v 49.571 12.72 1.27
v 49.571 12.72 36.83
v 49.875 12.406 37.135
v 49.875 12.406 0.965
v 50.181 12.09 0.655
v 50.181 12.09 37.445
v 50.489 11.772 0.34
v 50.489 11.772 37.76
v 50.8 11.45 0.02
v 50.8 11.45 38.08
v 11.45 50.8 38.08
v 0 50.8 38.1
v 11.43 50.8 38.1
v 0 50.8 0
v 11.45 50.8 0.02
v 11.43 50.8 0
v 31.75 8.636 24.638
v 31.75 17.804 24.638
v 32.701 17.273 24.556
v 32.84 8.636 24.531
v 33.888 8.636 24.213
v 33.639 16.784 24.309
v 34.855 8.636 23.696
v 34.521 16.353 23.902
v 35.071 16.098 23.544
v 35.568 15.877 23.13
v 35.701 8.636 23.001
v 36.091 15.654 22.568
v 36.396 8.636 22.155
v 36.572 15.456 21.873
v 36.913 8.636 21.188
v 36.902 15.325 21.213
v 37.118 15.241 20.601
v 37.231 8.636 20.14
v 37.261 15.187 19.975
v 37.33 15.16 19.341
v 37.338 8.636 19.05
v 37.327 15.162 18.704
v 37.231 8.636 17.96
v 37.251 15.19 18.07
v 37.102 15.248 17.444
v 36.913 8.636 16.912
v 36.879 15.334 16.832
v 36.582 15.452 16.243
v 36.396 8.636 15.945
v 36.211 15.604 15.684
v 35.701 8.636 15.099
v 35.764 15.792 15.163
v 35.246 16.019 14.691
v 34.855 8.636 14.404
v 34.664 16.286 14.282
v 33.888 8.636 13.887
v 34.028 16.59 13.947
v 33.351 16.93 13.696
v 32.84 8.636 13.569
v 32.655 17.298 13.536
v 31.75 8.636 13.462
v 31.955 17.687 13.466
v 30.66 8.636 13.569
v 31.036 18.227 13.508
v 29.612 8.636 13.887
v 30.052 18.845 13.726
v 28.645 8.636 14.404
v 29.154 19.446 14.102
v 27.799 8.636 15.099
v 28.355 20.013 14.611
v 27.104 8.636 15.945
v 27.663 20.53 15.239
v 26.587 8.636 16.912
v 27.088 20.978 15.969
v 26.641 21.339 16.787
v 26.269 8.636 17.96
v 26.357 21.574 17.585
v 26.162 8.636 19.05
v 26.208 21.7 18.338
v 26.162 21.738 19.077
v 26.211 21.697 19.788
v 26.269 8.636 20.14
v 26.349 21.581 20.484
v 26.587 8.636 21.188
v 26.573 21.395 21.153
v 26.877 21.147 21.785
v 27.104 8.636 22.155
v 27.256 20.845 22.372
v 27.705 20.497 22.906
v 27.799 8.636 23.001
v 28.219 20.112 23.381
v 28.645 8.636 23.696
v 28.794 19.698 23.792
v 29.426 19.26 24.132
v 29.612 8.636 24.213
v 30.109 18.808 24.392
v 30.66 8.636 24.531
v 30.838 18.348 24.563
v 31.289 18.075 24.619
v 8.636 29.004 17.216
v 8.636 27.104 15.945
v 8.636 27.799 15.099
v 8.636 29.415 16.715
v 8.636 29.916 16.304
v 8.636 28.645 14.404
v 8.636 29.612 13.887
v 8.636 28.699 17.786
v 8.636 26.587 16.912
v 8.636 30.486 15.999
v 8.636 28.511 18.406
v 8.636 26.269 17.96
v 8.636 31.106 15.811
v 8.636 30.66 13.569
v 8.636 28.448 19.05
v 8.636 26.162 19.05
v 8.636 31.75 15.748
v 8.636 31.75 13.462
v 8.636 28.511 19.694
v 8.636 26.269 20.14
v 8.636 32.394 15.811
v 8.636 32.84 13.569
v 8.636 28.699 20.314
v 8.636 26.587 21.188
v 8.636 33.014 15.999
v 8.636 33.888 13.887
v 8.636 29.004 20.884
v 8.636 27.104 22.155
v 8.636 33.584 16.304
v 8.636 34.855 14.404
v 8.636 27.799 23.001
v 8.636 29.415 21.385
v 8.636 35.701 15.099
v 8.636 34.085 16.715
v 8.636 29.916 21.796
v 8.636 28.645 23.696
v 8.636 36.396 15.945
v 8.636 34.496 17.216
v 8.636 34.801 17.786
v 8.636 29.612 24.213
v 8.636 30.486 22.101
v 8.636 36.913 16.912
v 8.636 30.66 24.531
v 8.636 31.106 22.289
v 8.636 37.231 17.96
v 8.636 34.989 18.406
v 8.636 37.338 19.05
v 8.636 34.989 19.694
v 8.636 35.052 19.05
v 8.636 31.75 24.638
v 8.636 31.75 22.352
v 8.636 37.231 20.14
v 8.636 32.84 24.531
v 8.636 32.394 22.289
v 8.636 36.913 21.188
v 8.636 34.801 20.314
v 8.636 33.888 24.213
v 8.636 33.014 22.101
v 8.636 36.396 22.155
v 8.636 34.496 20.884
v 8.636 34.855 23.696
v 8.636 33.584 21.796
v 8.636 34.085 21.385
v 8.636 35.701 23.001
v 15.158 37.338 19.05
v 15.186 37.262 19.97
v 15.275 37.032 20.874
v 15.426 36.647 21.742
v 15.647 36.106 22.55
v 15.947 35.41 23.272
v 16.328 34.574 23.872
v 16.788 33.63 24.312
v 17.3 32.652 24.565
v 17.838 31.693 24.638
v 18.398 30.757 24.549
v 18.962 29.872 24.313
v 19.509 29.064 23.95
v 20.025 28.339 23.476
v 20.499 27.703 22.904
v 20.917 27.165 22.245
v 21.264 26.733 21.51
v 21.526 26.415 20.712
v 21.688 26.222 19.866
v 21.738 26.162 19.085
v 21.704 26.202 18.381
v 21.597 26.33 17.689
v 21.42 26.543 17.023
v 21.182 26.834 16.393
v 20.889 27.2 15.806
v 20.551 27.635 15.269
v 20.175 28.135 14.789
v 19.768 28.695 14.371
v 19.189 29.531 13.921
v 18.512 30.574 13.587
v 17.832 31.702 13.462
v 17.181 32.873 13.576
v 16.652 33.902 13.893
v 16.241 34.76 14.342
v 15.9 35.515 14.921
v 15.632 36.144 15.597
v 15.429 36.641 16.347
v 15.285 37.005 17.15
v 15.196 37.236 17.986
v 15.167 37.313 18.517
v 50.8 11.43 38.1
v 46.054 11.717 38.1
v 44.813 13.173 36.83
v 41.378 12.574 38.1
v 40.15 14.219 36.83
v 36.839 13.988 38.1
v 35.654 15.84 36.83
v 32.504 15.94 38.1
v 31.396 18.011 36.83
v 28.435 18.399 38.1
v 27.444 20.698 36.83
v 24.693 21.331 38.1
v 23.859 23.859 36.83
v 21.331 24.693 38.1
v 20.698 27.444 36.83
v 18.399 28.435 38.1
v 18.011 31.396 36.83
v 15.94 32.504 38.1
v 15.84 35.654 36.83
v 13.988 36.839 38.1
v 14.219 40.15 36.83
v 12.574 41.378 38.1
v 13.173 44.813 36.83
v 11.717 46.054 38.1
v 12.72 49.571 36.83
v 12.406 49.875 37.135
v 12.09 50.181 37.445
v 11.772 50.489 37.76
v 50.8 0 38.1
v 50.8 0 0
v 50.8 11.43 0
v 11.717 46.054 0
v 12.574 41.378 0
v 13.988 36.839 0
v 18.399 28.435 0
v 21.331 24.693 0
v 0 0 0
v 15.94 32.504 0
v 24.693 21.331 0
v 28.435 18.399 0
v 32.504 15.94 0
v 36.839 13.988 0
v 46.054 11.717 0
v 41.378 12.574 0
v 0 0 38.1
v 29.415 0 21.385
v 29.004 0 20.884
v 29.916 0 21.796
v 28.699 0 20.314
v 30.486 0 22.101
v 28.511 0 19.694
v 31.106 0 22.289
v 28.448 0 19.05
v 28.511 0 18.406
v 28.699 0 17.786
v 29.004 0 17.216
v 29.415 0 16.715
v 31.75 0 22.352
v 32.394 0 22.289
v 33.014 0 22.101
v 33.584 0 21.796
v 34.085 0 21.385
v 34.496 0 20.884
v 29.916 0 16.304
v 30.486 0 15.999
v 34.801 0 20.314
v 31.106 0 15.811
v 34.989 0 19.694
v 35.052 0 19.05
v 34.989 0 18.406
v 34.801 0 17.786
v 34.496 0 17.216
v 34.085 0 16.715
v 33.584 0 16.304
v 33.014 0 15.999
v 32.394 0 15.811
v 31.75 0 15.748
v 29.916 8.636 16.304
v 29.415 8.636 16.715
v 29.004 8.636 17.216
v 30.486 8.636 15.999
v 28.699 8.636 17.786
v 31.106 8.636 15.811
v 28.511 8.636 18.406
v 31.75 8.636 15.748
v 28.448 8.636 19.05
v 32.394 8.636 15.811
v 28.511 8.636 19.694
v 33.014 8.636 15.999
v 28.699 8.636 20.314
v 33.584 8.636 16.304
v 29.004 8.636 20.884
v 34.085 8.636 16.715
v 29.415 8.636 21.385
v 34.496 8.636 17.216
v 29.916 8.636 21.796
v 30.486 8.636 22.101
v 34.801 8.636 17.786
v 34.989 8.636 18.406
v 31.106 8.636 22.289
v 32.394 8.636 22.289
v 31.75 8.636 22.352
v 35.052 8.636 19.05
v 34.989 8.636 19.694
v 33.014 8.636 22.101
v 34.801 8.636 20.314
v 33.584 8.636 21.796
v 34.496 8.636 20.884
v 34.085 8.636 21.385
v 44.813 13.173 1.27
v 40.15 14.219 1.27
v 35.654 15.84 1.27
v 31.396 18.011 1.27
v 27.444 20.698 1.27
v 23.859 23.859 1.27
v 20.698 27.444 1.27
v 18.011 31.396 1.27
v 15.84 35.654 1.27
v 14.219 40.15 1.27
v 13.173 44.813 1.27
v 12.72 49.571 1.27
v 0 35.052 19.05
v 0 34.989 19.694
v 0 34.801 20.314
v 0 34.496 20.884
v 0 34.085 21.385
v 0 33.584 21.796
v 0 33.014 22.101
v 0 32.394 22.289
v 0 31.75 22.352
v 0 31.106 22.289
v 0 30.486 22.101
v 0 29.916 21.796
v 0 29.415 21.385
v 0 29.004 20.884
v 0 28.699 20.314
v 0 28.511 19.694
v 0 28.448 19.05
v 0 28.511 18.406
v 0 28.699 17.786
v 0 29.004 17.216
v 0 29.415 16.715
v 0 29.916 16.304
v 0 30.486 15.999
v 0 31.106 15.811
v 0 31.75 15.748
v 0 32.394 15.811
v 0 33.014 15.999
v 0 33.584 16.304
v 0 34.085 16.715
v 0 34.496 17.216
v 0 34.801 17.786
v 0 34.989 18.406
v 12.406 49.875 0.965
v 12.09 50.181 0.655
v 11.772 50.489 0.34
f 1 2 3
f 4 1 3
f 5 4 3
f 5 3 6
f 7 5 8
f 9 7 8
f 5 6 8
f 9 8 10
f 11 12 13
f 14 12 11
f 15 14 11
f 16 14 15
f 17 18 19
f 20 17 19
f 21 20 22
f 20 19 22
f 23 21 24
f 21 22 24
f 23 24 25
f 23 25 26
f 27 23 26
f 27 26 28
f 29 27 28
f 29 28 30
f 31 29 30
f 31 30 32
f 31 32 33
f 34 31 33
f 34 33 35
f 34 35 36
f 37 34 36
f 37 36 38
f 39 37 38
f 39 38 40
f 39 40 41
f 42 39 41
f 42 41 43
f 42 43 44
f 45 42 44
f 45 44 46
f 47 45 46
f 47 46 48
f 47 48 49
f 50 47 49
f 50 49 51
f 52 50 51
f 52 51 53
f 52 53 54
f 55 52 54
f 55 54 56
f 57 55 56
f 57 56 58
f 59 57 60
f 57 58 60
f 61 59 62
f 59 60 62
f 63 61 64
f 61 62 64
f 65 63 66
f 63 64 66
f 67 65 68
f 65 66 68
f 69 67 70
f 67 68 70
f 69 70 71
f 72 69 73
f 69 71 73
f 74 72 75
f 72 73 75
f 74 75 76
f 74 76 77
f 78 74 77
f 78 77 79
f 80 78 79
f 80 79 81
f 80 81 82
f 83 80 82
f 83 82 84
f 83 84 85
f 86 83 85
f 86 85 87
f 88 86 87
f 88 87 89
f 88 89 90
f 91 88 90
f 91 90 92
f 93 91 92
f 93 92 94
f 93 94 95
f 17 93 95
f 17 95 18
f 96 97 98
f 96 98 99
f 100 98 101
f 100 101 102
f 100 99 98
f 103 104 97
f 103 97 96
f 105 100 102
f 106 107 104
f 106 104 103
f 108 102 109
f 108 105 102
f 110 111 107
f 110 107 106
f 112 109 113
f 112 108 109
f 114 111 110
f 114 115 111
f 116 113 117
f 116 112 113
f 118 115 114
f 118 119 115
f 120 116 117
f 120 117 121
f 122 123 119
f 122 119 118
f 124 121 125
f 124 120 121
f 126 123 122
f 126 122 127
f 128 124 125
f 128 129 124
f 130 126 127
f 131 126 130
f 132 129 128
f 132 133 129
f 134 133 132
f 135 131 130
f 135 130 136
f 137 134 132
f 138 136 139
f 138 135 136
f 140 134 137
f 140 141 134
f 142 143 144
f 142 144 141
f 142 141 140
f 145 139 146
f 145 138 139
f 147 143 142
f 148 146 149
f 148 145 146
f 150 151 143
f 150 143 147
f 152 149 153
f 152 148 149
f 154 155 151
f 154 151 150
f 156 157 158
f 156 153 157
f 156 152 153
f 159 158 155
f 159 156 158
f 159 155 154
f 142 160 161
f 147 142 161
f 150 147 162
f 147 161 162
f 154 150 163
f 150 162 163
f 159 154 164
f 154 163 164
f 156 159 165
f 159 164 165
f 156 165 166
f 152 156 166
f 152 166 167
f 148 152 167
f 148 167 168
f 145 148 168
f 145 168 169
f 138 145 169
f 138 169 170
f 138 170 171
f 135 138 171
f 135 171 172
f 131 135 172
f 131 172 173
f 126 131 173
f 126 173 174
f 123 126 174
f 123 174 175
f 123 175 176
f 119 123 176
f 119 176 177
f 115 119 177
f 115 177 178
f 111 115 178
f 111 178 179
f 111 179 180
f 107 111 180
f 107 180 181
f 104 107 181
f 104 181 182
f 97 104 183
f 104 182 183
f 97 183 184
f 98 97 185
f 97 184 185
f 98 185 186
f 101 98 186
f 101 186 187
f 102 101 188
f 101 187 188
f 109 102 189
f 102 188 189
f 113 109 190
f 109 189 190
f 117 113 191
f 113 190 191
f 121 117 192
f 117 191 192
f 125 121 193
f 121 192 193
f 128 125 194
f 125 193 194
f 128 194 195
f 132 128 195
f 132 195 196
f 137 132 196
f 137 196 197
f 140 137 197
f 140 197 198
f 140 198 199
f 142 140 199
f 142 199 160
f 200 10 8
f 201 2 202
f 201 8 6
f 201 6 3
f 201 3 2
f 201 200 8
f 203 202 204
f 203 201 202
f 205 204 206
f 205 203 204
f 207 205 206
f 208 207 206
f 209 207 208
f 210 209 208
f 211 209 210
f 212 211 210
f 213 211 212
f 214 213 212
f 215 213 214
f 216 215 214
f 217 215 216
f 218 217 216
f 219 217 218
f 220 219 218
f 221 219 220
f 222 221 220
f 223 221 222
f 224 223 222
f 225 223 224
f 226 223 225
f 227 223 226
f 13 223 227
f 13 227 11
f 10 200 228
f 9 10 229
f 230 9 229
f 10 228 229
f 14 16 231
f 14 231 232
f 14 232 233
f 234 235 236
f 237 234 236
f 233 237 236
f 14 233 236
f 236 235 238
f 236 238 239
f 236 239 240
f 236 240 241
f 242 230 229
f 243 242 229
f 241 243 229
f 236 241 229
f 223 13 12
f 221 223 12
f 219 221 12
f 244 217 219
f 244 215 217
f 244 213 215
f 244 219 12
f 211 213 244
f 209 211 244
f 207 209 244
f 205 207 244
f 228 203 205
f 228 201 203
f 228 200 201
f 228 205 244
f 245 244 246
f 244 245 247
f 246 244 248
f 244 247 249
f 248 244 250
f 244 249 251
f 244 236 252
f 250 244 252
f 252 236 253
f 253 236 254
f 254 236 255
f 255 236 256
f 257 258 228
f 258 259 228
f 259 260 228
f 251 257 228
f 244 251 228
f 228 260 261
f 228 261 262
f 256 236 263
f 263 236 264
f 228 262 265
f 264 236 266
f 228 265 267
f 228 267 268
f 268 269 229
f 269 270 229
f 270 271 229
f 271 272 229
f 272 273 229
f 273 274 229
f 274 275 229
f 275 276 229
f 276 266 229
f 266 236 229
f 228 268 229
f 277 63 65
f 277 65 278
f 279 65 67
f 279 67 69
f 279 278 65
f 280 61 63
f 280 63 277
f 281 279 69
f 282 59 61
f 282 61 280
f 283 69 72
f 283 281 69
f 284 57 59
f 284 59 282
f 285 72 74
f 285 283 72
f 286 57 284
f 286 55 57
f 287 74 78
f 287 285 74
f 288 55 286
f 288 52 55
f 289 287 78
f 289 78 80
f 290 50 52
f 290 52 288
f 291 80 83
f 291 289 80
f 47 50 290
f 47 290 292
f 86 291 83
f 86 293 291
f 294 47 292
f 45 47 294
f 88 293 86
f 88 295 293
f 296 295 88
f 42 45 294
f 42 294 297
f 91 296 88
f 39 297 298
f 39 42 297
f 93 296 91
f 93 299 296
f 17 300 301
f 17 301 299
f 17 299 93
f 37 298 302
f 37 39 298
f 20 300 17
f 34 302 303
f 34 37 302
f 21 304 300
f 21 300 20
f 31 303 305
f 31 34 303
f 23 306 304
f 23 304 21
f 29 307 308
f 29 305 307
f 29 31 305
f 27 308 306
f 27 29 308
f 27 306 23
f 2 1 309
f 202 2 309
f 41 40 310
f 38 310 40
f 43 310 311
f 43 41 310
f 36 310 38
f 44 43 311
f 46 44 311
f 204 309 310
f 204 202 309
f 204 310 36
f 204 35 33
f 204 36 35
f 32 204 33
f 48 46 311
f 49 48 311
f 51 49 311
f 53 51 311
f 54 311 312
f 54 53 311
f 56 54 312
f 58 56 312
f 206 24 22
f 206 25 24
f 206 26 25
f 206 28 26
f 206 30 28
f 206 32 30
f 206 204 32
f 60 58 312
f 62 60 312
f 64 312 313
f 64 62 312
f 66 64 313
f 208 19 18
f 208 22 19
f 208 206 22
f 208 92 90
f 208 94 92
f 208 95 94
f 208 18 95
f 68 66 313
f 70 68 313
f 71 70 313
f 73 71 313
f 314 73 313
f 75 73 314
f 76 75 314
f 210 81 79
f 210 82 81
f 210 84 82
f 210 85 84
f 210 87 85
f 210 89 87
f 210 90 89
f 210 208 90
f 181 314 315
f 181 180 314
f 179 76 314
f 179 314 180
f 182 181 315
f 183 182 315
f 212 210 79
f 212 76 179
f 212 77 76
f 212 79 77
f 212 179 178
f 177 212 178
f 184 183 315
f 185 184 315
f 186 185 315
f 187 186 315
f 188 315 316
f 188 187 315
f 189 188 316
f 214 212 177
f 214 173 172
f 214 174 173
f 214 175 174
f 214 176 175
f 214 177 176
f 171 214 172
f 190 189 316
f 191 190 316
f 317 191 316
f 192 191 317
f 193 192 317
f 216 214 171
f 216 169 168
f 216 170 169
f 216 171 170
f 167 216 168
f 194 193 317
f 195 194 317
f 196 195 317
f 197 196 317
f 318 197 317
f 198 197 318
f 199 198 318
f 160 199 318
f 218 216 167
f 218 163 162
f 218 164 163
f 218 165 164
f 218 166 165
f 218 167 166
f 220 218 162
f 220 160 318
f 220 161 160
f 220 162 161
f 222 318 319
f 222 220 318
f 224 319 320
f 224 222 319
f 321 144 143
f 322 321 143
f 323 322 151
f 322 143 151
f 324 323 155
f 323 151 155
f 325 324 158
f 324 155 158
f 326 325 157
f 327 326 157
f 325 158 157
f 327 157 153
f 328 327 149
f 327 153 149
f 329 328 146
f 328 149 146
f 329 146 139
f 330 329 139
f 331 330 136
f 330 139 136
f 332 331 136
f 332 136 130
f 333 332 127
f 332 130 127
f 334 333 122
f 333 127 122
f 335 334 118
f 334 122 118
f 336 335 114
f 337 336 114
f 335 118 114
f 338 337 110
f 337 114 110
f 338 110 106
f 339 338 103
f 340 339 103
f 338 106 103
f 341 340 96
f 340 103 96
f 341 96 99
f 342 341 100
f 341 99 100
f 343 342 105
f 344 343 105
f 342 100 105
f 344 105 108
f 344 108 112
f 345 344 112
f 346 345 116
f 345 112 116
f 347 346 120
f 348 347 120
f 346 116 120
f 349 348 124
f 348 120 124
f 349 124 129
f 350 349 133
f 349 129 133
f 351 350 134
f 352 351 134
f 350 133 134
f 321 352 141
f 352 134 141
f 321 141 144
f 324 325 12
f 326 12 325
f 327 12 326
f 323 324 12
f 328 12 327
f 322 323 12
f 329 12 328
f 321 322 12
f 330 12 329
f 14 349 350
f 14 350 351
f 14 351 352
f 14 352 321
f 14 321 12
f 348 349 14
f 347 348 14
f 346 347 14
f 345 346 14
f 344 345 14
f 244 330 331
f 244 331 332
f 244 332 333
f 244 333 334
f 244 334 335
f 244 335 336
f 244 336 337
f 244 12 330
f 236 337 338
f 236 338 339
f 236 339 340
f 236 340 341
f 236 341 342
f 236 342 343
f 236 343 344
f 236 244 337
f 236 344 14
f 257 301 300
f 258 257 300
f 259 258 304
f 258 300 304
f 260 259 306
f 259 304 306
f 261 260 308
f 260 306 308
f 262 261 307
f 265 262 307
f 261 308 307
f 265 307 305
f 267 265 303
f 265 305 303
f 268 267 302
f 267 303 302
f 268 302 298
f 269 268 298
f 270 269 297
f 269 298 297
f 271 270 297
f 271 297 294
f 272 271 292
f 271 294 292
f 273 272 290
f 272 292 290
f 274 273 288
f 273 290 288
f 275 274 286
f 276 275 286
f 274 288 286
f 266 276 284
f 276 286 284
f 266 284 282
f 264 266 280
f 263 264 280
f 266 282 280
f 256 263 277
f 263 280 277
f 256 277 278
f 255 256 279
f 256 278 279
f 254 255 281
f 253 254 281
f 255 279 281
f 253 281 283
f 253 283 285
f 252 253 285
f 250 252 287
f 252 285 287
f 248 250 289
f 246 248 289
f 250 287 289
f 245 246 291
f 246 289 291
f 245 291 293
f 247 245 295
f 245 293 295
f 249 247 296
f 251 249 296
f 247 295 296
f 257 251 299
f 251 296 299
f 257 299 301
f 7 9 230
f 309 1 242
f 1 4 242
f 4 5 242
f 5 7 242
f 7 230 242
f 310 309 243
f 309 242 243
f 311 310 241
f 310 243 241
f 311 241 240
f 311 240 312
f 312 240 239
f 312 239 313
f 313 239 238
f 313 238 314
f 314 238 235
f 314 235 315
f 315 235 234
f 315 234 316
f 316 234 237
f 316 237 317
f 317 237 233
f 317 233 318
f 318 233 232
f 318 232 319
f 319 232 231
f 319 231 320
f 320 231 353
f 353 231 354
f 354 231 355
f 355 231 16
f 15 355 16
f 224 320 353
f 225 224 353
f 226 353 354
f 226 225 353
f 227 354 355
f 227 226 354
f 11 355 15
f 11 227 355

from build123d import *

# Parameters (mm, degrees)
SKETCH1_W           = 50.8
SKETCH1_H           = 38.1
BOSS_EXTRUDE1_DEPTH = 50.8
SKETCH2_W           = 38.1
SKETCH2_H           = 38.1
CUT_EXTRUDE1_DEPTH  = 38.1
SKETCH3_R           = 5.588
CUT_EXTRUDE2_DEPTH  = 4.064
SKETCH4_R           = 3.302
CUT_EXTRUDE3_DEPTH  = 8.636
SKETCH5_R           = 5.588
CUT_EXTRUDE4_DEPTH  = 4.064
SKETCH6_R           = 3.302
CUT_EXTRUDE5_DEPTH  = 8.636
FILLET1_R           = 38.1


with BuildPart() as part:
    # Sketch1 → Boss-Extrude1 (new body)
    with BuildSketch(Plane(origin=(0, 0, 0), x_dir=(1, 0, 0), z_dir=(0, 1, 0))):
        with Locations((25.4, -19.05)):
            Rectangle(SKETCH1_W, SKETCH1_H)
    extrude(amount=BOSS_EXTRUDE1_DEPTH)

    # Sketch2 → Cut-Extrude1 (cut)
    with BuildSketch(Plane.XY.offset(38.1)):
        with Locations((31.75, 31.75)):
            Rectangle(SKETCH2_W, SKETCH2_H)
    extrude(amount=-CUT_EXTRUDE1_DEPTH, mode=Mode.SUBTRACT)

    # Sketch3 → Cut-Extrude2 (cut)
    with BuildSketch(Plane(origin=(0, 12.7, 0), x_dir=(1, 0, 0), z_dir=(0, 1, 0))):
        with Locations(Location((31.75, -19.05, 0), (0, 0, 270))):
            Circle(SKETCH3_R)
    extrude(amount=-CUT_EXTRUDE2_DEPTH, mode=Mode.SUBTRACT)

    # Sketch4 → Cut-Extrude3 (cut)
    with BuildSketch(Plane(origin=(0, 8.636, 0), x_dir=(1, 0, 0), z_dir=(0, 1, 0))):
        with Locations(Location((31.75, -19.05, 0), (0, 0, 270))):
            Circle(SKETCH4_R)
    extrude(amount=-CUT_EXTRUDE3_DEPTH, mode=Mode.SUBTRACT)

    # Sketch5 → Cut-Extrude4 (cut)
    with BuildSketch(Plane(origin=(12.7, 0, 0), x_dir=(0, 0, -1), z_dir=(1, 0, 0))):
        with Locations(Location((-19.05, 31.75, 0), (0, 0, 90))):
            Circle(SKETCH5_R)
    extrude(amount=-CUT_EXTRUDE4_DEPTH, mode=Mode.SUBTRACT)

    # Sketch6 → Cut-Extrude5 (cut)
    with BuildSketch(Plane(origin=(8.636, 0, 0), x_dir=(0, 0, -1), z_dir=(1, 0, 0))):
        with Locations(Location((-19.05, 31.75, 0), (0, 0, 90))):
            Circle(SKETCH6_R)
    extrude(amount=-CUT_EXTRUDE5_DEPTH, mode=Mode.SUBTRACT)

    # Fillet1
    # the kernel refuses this fillet: 38.1 mm, written as the material it adds along each edge
    with BuildSketch(Plane(origin=(12.7, 12.7, 38.1), x_dir=(0, 1, 0), z_dir=(0, 0, -1))) as fillet1_piece_1_section:
        with BuildLine():
            CenterArc((FILLET1_R, FILLET1_R), FILLET1_R, 180, 90)
            Line((0, FILLET1_R), (0, 0))
            Line((0, 0), (FILLET1_R, 0))
        make_face()
    fillet1_piece_1 = extrude(amount=38.1, mode=Mode.PRIVATE)
    fillet1_piece_1 = fillet1_piece_1 - Plane(origin=(21.164766811, 31.75, 19.05), x_dir=(0, 1, 0), z_dir=(1, 0, 0)) * Cylinder(5.588, 229, mode=Mode.PRIVATE)
    fillet1_piece_1 = fillet1_piece_1 - Plane(origin=(31.75, 21.164747652, 19.05), x_dir=(0, 0, 1), z_dir=(0, 1, 0)) * Cylinder(5.588, 229, mode=Mode.PRIVATE)
    add(fillet1_piece_1)

    # Chamfer1
    # the kernel refuses this chamfer: 1.27 mm, written as the material it takes off along each edge
    with BuildSketch(Plane(origin=(50.8, 12.7, 41.316229993), x_dir=(-0.9990092495059921, 0.04450302687991344, 0), z_dir=(0, 0, -1))) as chamfer1_piece_1:
        with BuildLine():
            Line((1.265623079, 0), (-0.09253308, -1.283159884))
            Line((-0.09253308, -1.283159884), (-0.117907915, -1.282029507))
            ThreePointArc((-0.117907915, -1.282029507), (-0.053990428, -0.641235865), (-0.025374835, 0.001130377))
            Line((-0.025374835, 0.001130377), (0.001130377, 0.025374835))
            ThreePointArc((0.001130377, 0.025374835), (0.632880934, 0.002485367), (1.265934324, 0.025398093))
            Line((1.265934324, 0.025398093), (1.265623079, 0))
        make_face()
    extrude(amount=44.532459986, mode=Mode.SUBTRACT)
    with BuildSketch(Plane(origin=(12.7, 50.8, 41.316229993), x_dir=(0.04450302687991419, -0.9990092495059921, 0), z_dir=(0, 0, -1))) as chamfer1_piece_2:
        with BuildLine():
            Line((1.265623079, 0), (-0.09253308, 1.283159884))
            Line((-0.09253308, 1.283159884), (-0.117907915, 1.282029507))
            ThreePointArc((-0.117907915, 1.282029507), (-0.053990428, 0.641235865), (-0.025374835, -0.001130377))
            Line((-0.025374835, -0.001130377), (0.001130377, -0.025374835))
            ThreePointArc((0.001130377, -0.025374835), (0.632880934, -0.002485367), (1.265934324, -0.025398093))
            Line((1.265934324, -0.025398093), (1.265623079, 0))
        make_face()
    extrude(amount=44.532459986, mode=Mode.SUBTRACT)
    with BuildSketch(Plane(origin=(50.8, 50.8, 38.1), x_dir=(0.08565212644692491, -0.9963251041879453, 0), z_dir=(0.9963251041879453, 0.08565212644692491, 0))) as chamfer1_piece_3:
        with BuildLine():
            Line((38.064078976, 1.305921024), (39.405921024, -0.035921024))
            Line((39.405921024, -0.035921024), (39.405921024, -0.061321024))
            ThreePointArc((39.405921024, -0.061321024), (38.752960512, -0.0254), (38.1, -0.0254))
            Line((38.1, -0.0254), (38.0746, 0))
            ThreePointArc((38.0746, 0), (38.0746, 0.652960512), (38.038678976, 1.305921024))
            Line((38.038678976, 1.305921024), (38.064078976, 1.305921024))
        make_face()
    revolve(axis=Axis((50.8, 50.8, 38.1), (0, 0, -1)), revolution_arc=99.827051452, mode=Mode.SUBTRACT)
    with BuildSketch(Plane(origin=(50.8, 50.8, 0), x_dir=(0.08565212644692491, -0.9963251041879453, 0), z_dir=(0.9963251041879453, 0.08565212644692491, 0))) as chamfer1_piece_4:
        with BuildLine():
            Line((38.064078976, -1.305921024), (39.405921024, 0.035921024))
            Line((39.405921024, 0.035921024), (39.405921024, 0.061321024))
            ThreePointArc((39.405921024, 0.061321024), (38.752960512, 0.0254), (38.1, 0.0254))
            Line((38.1, 0.0254), (38.0746, 0))
            ThreePointArc((38.0746, 0), (38.0746, -0.652960512), (38.038678976, -1.305921024))
            Line((38.038678976, -1.305921024), (38.064078976, -1.305921024))
        make_face()
    revolve(axis=Axis((50.8, 50.8, 0), (0, 0, -1)), revolution_arc=99.827051452, mode=Mode.SUBTRACT)


solid = part.part
